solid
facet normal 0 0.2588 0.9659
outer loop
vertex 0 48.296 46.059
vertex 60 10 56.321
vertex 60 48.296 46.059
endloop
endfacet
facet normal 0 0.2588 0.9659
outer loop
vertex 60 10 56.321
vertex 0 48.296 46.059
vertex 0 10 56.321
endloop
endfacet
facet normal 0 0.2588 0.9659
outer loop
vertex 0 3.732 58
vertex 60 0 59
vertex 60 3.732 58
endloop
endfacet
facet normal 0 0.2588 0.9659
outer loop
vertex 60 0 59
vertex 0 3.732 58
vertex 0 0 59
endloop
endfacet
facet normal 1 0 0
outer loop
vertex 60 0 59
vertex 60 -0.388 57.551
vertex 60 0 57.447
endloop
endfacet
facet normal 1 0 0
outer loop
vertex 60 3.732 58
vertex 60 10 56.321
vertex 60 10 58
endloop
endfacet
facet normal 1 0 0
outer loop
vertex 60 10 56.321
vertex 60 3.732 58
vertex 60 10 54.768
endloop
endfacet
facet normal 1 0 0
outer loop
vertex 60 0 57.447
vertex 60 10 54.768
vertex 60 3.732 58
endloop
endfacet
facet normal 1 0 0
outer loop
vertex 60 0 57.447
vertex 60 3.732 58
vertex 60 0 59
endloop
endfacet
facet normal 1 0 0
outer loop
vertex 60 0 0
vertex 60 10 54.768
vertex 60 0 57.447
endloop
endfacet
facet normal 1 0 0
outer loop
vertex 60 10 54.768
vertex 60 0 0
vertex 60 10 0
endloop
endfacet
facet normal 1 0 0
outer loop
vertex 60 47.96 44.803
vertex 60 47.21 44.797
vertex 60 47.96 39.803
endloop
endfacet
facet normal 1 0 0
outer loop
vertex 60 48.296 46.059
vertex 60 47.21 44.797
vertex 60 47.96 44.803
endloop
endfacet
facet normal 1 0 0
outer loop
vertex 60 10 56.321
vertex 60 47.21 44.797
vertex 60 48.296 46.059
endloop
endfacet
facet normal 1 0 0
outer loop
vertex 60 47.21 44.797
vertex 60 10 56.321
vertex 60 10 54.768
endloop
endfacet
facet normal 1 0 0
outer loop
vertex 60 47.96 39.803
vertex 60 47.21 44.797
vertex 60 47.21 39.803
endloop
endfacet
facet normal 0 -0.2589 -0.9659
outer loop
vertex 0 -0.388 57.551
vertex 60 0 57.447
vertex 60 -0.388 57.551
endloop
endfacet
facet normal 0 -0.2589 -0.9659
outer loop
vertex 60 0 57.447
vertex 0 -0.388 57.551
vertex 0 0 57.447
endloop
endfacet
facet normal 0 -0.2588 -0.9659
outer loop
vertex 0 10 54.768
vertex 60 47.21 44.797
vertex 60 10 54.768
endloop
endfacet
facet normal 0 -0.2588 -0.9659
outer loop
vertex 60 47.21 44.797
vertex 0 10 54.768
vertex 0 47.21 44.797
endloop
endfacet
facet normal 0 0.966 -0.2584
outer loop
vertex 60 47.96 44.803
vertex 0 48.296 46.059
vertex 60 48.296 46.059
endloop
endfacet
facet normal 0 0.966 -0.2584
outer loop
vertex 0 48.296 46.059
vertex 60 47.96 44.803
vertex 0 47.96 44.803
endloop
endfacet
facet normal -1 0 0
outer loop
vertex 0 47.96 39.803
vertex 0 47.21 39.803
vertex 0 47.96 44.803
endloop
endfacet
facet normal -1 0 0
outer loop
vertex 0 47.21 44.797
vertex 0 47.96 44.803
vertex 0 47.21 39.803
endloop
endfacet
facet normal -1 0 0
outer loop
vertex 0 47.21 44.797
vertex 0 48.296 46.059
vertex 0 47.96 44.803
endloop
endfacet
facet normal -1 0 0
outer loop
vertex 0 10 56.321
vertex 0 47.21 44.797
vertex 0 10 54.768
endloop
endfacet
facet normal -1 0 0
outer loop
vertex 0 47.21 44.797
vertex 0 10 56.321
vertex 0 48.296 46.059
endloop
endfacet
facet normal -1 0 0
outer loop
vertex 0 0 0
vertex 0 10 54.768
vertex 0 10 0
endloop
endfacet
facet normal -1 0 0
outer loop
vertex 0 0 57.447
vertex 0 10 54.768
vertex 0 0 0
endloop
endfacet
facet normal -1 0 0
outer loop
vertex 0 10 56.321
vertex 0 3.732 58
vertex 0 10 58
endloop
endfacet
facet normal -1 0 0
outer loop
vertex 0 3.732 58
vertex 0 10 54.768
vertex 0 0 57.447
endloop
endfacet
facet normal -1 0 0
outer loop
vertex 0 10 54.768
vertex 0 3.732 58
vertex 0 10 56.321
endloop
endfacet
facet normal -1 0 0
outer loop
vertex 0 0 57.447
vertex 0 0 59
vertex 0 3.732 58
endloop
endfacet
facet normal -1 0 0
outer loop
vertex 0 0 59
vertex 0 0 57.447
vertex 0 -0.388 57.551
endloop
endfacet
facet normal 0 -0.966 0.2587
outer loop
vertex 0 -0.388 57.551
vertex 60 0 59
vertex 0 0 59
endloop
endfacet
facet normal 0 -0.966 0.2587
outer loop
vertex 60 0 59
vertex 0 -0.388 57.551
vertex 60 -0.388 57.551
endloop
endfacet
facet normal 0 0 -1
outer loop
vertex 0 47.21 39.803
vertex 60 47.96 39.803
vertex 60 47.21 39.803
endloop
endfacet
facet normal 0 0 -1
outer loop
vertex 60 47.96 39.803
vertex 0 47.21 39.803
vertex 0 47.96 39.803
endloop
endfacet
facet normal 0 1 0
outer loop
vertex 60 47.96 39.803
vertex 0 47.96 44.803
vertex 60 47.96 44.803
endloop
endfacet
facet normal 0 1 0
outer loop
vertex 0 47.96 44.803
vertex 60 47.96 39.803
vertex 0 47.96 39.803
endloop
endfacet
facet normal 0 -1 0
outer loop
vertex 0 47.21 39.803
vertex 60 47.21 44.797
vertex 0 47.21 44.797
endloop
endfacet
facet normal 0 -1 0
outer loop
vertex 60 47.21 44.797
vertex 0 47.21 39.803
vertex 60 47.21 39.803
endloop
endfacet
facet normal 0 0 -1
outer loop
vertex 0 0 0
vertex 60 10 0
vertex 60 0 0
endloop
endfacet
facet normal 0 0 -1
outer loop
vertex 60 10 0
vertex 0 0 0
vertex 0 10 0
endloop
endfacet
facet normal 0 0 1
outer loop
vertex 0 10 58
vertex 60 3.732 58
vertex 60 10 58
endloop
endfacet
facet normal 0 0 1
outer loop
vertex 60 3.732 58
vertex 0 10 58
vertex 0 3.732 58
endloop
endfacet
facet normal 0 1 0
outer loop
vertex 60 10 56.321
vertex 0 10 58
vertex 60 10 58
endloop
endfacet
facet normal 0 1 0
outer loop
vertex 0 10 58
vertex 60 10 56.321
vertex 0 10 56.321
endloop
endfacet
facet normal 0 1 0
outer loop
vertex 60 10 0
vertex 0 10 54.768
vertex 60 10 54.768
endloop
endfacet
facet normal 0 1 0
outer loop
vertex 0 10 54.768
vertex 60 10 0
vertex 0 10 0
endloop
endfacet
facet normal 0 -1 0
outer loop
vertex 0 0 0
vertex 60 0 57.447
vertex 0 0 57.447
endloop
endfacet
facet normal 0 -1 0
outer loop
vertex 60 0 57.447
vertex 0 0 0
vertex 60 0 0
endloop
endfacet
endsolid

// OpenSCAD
// file: constants.scad
STAND_X = 60;
STAND_Z = 1.5;
STAND_Y = 50;
DESK_DISTANCE_Z = 59;
NITORKEY_KEYBOARD_ANGLE = 75;
// main file
include <constants.scad>

module main() {
  all();

}

module all() {
  // Translate and render the part with the base Z height
  translate([0, 0, DESK_DISTANCE_Z])
    nitorkey_and_keyboard_parts();

  // Render the desk part
  desk_part();
}

module nitorkey_and_keyboard_parts(){
  translate([STAND_X, 0, 0])
    rotate([90 - NITORKEY_KEYBOARD_ANGLE, 180, 0]){
    
    nitrokey_part();
  
    translate([0, STAND_Y, STAND_Z - 0.2])  // Position keyboard part relative to nitrokey
      rotate([NITORKEY_KEYBOARD_ANGLE, 0, 0])  // Rotate keyboard part based on specified angle	  
      keyboard_part();
  }
}

module nitrokey_part(){
  NITROKEY_PART_X = STAND_X;
  NITROKEY_PART_Y = STAND_Y;
  NITROKEY_PART_Z = STAND_Z;

  // Create the base square
  linear_extrude(NITROKEY_PART_Z)
    square([NITROKEY_PART_X, NITROKEY_PART_Y]);
}

module keyboard_part(){
  KEYBOARD_PART_X = STAND_X;
  KEYBOARD_PART_Y = 5;
  KEYBOARD_PART_Z = 0.75;

  // Create the base square
  linear_extrude(KEYBOARD_PART_Z)
    square([KEYBOARD_PART_X, KEYBOARD_PART_Y]);
}

module desk_part(){
  DESK_PART_Z = DESK_DISTANCE_Z - 1;
  DESK_PART_X = STAND_X;
  DESK_PART_Y = 10;

  linear_extrude(DESK_PART_Z)
    square([DESK_PART_X, DESK_PART_Y]);
}

main();
